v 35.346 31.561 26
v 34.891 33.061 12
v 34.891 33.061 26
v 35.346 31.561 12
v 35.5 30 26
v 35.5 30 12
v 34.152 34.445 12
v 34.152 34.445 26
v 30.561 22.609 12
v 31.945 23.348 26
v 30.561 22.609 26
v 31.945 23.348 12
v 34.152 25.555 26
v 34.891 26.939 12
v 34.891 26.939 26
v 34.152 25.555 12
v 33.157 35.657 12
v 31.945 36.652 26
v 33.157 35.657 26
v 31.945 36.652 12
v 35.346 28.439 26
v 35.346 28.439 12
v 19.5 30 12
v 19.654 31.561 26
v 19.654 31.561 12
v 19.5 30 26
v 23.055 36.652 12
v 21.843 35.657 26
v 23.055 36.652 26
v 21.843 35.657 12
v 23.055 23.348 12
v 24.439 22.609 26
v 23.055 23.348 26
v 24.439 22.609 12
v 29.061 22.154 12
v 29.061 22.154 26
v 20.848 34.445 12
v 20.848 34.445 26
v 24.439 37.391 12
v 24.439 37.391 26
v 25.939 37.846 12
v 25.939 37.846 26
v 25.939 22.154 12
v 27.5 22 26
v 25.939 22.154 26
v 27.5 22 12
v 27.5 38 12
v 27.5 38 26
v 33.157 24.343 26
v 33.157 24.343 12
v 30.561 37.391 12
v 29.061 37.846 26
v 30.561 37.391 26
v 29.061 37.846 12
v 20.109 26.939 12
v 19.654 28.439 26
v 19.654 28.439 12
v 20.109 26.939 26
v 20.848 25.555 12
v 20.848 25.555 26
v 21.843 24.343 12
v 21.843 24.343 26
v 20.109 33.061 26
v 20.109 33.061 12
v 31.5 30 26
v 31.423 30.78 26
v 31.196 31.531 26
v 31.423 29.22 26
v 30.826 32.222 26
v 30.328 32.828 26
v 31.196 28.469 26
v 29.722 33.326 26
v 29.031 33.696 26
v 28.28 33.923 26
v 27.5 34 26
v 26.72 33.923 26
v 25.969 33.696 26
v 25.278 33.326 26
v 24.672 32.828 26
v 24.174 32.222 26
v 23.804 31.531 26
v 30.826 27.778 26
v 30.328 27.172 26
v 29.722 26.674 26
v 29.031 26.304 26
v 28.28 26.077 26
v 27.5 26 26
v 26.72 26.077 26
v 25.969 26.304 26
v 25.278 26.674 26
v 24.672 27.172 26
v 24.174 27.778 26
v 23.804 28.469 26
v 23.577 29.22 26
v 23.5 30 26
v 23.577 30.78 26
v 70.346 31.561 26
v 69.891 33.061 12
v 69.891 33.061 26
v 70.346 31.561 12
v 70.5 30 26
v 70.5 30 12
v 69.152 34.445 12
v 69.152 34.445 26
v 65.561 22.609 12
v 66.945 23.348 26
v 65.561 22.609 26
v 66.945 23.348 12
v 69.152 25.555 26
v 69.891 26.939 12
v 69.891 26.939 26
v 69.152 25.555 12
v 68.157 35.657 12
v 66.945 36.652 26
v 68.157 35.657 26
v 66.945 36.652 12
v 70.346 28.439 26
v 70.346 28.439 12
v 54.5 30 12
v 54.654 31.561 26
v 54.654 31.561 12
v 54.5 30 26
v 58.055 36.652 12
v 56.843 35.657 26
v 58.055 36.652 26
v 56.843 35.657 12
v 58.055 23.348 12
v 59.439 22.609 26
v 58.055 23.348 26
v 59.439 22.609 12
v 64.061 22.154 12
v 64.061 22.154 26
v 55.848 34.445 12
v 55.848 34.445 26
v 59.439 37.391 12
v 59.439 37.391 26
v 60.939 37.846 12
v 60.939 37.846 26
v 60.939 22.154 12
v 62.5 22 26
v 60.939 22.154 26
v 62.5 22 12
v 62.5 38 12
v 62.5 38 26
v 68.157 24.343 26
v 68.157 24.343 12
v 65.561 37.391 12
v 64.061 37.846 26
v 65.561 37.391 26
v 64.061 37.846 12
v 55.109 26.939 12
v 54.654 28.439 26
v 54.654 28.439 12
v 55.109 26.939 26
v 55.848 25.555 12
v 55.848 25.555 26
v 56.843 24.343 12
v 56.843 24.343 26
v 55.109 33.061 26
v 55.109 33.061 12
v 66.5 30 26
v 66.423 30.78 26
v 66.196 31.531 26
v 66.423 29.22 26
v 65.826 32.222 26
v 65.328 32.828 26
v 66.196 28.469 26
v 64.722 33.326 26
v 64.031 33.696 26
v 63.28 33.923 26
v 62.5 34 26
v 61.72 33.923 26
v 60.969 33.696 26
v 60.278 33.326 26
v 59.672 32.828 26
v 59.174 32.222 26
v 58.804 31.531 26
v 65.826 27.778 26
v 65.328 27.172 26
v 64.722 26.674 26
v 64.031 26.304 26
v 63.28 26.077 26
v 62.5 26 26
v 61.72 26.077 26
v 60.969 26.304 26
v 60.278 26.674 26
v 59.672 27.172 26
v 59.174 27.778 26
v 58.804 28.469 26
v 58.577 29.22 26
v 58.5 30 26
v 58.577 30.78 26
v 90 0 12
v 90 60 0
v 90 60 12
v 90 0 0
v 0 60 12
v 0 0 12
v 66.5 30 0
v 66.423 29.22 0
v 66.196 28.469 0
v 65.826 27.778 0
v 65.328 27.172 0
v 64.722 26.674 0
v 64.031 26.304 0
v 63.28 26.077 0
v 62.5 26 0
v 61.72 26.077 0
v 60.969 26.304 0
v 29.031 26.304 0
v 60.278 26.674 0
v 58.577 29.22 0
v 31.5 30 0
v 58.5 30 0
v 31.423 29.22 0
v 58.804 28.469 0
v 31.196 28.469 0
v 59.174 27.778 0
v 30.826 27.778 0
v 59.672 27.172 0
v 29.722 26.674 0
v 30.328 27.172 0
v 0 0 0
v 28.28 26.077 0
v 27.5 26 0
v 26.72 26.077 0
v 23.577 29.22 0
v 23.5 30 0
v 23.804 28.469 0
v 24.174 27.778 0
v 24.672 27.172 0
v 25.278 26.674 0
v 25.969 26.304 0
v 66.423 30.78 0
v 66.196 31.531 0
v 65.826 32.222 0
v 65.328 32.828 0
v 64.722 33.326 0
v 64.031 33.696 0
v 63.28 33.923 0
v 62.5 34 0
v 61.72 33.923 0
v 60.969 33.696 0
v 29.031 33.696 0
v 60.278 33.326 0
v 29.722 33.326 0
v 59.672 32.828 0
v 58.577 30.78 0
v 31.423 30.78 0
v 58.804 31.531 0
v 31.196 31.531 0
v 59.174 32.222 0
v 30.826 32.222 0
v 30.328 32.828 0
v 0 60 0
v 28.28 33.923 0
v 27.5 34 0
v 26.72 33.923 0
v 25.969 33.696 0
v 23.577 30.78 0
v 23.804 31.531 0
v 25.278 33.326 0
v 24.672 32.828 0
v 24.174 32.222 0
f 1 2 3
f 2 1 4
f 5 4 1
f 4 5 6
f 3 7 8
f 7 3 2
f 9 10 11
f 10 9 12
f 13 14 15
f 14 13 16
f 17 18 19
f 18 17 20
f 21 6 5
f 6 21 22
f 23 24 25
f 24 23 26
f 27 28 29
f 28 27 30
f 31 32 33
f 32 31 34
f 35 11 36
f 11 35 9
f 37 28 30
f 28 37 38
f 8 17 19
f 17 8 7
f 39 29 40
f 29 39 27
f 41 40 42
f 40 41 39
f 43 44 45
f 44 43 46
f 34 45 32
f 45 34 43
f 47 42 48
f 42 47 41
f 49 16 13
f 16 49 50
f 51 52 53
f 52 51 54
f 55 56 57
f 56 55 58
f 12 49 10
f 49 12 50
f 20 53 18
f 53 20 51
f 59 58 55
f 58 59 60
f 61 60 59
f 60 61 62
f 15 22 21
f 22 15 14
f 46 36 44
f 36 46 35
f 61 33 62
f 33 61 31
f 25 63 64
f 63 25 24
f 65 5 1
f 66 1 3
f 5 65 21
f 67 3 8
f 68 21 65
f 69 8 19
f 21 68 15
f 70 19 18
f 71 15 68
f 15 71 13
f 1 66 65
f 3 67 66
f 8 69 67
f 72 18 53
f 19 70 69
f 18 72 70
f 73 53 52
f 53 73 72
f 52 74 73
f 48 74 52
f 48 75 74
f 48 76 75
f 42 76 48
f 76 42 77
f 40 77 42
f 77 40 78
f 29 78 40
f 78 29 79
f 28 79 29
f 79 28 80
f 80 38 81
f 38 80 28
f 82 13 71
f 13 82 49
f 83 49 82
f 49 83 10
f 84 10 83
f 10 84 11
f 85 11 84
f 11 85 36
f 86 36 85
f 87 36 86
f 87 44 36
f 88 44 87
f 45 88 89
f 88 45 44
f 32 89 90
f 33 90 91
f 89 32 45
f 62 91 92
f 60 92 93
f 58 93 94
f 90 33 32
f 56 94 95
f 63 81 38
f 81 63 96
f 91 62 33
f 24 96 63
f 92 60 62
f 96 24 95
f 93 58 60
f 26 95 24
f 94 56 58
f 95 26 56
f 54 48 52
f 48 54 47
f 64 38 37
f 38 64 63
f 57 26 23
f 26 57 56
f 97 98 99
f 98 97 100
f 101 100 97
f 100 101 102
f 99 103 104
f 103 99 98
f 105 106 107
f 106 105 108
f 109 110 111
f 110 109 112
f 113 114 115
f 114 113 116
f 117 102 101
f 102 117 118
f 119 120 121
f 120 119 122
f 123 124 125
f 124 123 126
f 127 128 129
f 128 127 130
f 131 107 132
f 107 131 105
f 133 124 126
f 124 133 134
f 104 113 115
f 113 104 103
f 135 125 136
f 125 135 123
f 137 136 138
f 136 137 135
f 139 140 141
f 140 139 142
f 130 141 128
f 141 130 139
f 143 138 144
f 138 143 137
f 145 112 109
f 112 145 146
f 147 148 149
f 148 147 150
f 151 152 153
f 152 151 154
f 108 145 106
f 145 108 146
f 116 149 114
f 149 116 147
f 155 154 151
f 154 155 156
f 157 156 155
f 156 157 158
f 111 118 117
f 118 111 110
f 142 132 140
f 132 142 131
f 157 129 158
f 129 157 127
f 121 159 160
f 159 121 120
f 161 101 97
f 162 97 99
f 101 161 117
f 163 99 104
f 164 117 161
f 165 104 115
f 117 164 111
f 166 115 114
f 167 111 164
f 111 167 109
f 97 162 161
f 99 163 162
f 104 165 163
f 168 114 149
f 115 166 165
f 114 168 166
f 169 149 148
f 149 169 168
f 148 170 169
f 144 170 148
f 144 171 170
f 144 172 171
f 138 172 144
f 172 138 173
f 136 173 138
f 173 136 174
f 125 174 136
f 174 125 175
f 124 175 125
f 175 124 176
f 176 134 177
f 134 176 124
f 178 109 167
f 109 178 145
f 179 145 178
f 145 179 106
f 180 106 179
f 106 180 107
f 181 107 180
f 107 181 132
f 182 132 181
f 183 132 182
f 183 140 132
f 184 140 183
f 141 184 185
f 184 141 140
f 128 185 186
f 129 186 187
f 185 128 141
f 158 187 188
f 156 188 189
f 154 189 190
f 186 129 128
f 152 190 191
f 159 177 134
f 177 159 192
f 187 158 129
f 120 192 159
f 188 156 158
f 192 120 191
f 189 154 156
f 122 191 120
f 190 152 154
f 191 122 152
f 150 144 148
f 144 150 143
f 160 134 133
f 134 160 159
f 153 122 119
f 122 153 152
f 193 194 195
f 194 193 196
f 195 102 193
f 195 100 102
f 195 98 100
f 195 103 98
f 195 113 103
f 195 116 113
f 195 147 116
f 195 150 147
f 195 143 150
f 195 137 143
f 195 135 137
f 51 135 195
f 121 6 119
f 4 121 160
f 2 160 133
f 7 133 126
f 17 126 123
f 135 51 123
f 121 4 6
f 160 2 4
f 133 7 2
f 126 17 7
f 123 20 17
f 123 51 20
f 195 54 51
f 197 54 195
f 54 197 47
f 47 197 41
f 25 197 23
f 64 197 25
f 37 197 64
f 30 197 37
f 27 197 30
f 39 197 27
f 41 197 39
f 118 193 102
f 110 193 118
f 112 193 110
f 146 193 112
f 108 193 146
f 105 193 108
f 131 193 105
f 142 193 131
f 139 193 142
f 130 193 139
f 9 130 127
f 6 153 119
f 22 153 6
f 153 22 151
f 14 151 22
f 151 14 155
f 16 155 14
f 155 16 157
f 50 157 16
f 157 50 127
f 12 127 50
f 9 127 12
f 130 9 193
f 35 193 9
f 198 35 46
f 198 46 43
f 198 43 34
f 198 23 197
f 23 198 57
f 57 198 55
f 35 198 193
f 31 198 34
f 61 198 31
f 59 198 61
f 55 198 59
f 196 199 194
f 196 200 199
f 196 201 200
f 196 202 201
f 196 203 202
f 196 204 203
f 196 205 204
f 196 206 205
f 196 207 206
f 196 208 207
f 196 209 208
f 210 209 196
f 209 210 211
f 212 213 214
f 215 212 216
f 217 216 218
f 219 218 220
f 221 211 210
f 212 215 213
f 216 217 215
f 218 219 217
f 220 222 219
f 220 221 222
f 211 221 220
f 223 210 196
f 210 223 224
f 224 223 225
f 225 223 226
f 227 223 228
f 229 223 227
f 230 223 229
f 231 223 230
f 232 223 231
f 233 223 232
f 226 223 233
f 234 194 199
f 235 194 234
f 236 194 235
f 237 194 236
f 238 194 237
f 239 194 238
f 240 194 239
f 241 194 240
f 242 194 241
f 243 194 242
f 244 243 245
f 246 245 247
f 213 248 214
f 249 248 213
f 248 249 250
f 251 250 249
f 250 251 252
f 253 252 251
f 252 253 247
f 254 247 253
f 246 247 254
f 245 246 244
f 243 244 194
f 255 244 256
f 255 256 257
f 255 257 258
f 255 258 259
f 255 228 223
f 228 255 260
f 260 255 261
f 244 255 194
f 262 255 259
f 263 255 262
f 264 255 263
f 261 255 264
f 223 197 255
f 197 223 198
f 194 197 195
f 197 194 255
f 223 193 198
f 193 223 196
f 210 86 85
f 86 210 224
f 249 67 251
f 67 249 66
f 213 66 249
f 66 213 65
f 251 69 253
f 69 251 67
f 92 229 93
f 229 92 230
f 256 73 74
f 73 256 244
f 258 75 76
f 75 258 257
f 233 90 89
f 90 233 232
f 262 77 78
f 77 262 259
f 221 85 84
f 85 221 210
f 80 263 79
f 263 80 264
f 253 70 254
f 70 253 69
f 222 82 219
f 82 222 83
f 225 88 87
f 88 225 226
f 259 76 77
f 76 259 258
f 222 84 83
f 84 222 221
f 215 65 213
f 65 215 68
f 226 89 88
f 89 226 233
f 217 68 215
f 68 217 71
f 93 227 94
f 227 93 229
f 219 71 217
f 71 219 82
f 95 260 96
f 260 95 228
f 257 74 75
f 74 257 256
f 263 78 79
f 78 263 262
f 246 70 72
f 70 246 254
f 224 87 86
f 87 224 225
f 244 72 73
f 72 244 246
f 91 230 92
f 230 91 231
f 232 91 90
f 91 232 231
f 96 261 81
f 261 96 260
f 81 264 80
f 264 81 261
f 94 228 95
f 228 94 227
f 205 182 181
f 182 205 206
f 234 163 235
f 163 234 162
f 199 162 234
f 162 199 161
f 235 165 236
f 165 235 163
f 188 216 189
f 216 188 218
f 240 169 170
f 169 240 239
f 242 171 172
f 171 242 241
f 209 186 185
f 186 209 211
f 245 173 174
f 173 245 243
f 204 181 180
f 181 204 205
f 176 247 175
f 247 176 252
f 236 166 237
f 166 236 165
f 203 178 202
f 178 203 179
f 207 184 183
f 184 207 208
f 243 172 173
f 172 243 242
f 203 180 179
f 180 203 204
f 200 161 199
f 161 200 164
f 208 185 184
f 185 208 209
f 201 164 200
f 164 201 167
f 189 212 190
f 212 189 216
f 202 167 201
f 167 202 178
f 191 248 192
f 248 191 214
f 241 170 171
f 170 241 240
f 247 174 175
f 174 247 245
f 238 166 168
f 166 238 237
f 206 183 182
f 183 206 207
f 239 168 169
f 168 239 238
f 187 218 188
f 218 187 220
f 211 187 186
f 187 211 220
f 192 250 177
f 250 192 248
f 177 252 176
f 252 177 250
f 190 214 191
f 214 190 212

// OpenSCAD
$fn = 32;

// ----------------------------------------------------------------------
// Drill jig: two_boss jig
// ----------------------------------------------------------------------

// --- parameters (mm) ---
plate_l = 90;             // plate length, X
plate_w = 60;             // plate width, Y
plate_t = 12;             // plate thickness
boss_d = 16;              // guide boss diameter
boss_h = 15;              // boss height above the plate
guide_d = 8;              // guide hole diameter
boss_pitch = 35;          // boss pitch

n_boss = 2;  // guide bosses
boss_x0 = (plate_l - (n_boss - 1) * boss_pitch) / 2;  // first boss X
boss_top = plate_t - 1 + boss_h;  // boss crown height
total_h = boss_top;  // overall height

difference() {
  union() {
  cube([plate_l, plate_w, plate_t]);
  for (i = [0 : n_boss - 1])
    translate([boss_x0 + i * boss_pitch, plate_w / 2, plate_t - 1])
      cylinder(h = boss_h, d = boss_d);
  }
  for (i = [0 : n_boss - 1])
    translate([boss_x0 + i * boss_pitch, plate_w / 2, -1])
      cylinder(h = plate_t + boss_h, d = guide_d);
}
